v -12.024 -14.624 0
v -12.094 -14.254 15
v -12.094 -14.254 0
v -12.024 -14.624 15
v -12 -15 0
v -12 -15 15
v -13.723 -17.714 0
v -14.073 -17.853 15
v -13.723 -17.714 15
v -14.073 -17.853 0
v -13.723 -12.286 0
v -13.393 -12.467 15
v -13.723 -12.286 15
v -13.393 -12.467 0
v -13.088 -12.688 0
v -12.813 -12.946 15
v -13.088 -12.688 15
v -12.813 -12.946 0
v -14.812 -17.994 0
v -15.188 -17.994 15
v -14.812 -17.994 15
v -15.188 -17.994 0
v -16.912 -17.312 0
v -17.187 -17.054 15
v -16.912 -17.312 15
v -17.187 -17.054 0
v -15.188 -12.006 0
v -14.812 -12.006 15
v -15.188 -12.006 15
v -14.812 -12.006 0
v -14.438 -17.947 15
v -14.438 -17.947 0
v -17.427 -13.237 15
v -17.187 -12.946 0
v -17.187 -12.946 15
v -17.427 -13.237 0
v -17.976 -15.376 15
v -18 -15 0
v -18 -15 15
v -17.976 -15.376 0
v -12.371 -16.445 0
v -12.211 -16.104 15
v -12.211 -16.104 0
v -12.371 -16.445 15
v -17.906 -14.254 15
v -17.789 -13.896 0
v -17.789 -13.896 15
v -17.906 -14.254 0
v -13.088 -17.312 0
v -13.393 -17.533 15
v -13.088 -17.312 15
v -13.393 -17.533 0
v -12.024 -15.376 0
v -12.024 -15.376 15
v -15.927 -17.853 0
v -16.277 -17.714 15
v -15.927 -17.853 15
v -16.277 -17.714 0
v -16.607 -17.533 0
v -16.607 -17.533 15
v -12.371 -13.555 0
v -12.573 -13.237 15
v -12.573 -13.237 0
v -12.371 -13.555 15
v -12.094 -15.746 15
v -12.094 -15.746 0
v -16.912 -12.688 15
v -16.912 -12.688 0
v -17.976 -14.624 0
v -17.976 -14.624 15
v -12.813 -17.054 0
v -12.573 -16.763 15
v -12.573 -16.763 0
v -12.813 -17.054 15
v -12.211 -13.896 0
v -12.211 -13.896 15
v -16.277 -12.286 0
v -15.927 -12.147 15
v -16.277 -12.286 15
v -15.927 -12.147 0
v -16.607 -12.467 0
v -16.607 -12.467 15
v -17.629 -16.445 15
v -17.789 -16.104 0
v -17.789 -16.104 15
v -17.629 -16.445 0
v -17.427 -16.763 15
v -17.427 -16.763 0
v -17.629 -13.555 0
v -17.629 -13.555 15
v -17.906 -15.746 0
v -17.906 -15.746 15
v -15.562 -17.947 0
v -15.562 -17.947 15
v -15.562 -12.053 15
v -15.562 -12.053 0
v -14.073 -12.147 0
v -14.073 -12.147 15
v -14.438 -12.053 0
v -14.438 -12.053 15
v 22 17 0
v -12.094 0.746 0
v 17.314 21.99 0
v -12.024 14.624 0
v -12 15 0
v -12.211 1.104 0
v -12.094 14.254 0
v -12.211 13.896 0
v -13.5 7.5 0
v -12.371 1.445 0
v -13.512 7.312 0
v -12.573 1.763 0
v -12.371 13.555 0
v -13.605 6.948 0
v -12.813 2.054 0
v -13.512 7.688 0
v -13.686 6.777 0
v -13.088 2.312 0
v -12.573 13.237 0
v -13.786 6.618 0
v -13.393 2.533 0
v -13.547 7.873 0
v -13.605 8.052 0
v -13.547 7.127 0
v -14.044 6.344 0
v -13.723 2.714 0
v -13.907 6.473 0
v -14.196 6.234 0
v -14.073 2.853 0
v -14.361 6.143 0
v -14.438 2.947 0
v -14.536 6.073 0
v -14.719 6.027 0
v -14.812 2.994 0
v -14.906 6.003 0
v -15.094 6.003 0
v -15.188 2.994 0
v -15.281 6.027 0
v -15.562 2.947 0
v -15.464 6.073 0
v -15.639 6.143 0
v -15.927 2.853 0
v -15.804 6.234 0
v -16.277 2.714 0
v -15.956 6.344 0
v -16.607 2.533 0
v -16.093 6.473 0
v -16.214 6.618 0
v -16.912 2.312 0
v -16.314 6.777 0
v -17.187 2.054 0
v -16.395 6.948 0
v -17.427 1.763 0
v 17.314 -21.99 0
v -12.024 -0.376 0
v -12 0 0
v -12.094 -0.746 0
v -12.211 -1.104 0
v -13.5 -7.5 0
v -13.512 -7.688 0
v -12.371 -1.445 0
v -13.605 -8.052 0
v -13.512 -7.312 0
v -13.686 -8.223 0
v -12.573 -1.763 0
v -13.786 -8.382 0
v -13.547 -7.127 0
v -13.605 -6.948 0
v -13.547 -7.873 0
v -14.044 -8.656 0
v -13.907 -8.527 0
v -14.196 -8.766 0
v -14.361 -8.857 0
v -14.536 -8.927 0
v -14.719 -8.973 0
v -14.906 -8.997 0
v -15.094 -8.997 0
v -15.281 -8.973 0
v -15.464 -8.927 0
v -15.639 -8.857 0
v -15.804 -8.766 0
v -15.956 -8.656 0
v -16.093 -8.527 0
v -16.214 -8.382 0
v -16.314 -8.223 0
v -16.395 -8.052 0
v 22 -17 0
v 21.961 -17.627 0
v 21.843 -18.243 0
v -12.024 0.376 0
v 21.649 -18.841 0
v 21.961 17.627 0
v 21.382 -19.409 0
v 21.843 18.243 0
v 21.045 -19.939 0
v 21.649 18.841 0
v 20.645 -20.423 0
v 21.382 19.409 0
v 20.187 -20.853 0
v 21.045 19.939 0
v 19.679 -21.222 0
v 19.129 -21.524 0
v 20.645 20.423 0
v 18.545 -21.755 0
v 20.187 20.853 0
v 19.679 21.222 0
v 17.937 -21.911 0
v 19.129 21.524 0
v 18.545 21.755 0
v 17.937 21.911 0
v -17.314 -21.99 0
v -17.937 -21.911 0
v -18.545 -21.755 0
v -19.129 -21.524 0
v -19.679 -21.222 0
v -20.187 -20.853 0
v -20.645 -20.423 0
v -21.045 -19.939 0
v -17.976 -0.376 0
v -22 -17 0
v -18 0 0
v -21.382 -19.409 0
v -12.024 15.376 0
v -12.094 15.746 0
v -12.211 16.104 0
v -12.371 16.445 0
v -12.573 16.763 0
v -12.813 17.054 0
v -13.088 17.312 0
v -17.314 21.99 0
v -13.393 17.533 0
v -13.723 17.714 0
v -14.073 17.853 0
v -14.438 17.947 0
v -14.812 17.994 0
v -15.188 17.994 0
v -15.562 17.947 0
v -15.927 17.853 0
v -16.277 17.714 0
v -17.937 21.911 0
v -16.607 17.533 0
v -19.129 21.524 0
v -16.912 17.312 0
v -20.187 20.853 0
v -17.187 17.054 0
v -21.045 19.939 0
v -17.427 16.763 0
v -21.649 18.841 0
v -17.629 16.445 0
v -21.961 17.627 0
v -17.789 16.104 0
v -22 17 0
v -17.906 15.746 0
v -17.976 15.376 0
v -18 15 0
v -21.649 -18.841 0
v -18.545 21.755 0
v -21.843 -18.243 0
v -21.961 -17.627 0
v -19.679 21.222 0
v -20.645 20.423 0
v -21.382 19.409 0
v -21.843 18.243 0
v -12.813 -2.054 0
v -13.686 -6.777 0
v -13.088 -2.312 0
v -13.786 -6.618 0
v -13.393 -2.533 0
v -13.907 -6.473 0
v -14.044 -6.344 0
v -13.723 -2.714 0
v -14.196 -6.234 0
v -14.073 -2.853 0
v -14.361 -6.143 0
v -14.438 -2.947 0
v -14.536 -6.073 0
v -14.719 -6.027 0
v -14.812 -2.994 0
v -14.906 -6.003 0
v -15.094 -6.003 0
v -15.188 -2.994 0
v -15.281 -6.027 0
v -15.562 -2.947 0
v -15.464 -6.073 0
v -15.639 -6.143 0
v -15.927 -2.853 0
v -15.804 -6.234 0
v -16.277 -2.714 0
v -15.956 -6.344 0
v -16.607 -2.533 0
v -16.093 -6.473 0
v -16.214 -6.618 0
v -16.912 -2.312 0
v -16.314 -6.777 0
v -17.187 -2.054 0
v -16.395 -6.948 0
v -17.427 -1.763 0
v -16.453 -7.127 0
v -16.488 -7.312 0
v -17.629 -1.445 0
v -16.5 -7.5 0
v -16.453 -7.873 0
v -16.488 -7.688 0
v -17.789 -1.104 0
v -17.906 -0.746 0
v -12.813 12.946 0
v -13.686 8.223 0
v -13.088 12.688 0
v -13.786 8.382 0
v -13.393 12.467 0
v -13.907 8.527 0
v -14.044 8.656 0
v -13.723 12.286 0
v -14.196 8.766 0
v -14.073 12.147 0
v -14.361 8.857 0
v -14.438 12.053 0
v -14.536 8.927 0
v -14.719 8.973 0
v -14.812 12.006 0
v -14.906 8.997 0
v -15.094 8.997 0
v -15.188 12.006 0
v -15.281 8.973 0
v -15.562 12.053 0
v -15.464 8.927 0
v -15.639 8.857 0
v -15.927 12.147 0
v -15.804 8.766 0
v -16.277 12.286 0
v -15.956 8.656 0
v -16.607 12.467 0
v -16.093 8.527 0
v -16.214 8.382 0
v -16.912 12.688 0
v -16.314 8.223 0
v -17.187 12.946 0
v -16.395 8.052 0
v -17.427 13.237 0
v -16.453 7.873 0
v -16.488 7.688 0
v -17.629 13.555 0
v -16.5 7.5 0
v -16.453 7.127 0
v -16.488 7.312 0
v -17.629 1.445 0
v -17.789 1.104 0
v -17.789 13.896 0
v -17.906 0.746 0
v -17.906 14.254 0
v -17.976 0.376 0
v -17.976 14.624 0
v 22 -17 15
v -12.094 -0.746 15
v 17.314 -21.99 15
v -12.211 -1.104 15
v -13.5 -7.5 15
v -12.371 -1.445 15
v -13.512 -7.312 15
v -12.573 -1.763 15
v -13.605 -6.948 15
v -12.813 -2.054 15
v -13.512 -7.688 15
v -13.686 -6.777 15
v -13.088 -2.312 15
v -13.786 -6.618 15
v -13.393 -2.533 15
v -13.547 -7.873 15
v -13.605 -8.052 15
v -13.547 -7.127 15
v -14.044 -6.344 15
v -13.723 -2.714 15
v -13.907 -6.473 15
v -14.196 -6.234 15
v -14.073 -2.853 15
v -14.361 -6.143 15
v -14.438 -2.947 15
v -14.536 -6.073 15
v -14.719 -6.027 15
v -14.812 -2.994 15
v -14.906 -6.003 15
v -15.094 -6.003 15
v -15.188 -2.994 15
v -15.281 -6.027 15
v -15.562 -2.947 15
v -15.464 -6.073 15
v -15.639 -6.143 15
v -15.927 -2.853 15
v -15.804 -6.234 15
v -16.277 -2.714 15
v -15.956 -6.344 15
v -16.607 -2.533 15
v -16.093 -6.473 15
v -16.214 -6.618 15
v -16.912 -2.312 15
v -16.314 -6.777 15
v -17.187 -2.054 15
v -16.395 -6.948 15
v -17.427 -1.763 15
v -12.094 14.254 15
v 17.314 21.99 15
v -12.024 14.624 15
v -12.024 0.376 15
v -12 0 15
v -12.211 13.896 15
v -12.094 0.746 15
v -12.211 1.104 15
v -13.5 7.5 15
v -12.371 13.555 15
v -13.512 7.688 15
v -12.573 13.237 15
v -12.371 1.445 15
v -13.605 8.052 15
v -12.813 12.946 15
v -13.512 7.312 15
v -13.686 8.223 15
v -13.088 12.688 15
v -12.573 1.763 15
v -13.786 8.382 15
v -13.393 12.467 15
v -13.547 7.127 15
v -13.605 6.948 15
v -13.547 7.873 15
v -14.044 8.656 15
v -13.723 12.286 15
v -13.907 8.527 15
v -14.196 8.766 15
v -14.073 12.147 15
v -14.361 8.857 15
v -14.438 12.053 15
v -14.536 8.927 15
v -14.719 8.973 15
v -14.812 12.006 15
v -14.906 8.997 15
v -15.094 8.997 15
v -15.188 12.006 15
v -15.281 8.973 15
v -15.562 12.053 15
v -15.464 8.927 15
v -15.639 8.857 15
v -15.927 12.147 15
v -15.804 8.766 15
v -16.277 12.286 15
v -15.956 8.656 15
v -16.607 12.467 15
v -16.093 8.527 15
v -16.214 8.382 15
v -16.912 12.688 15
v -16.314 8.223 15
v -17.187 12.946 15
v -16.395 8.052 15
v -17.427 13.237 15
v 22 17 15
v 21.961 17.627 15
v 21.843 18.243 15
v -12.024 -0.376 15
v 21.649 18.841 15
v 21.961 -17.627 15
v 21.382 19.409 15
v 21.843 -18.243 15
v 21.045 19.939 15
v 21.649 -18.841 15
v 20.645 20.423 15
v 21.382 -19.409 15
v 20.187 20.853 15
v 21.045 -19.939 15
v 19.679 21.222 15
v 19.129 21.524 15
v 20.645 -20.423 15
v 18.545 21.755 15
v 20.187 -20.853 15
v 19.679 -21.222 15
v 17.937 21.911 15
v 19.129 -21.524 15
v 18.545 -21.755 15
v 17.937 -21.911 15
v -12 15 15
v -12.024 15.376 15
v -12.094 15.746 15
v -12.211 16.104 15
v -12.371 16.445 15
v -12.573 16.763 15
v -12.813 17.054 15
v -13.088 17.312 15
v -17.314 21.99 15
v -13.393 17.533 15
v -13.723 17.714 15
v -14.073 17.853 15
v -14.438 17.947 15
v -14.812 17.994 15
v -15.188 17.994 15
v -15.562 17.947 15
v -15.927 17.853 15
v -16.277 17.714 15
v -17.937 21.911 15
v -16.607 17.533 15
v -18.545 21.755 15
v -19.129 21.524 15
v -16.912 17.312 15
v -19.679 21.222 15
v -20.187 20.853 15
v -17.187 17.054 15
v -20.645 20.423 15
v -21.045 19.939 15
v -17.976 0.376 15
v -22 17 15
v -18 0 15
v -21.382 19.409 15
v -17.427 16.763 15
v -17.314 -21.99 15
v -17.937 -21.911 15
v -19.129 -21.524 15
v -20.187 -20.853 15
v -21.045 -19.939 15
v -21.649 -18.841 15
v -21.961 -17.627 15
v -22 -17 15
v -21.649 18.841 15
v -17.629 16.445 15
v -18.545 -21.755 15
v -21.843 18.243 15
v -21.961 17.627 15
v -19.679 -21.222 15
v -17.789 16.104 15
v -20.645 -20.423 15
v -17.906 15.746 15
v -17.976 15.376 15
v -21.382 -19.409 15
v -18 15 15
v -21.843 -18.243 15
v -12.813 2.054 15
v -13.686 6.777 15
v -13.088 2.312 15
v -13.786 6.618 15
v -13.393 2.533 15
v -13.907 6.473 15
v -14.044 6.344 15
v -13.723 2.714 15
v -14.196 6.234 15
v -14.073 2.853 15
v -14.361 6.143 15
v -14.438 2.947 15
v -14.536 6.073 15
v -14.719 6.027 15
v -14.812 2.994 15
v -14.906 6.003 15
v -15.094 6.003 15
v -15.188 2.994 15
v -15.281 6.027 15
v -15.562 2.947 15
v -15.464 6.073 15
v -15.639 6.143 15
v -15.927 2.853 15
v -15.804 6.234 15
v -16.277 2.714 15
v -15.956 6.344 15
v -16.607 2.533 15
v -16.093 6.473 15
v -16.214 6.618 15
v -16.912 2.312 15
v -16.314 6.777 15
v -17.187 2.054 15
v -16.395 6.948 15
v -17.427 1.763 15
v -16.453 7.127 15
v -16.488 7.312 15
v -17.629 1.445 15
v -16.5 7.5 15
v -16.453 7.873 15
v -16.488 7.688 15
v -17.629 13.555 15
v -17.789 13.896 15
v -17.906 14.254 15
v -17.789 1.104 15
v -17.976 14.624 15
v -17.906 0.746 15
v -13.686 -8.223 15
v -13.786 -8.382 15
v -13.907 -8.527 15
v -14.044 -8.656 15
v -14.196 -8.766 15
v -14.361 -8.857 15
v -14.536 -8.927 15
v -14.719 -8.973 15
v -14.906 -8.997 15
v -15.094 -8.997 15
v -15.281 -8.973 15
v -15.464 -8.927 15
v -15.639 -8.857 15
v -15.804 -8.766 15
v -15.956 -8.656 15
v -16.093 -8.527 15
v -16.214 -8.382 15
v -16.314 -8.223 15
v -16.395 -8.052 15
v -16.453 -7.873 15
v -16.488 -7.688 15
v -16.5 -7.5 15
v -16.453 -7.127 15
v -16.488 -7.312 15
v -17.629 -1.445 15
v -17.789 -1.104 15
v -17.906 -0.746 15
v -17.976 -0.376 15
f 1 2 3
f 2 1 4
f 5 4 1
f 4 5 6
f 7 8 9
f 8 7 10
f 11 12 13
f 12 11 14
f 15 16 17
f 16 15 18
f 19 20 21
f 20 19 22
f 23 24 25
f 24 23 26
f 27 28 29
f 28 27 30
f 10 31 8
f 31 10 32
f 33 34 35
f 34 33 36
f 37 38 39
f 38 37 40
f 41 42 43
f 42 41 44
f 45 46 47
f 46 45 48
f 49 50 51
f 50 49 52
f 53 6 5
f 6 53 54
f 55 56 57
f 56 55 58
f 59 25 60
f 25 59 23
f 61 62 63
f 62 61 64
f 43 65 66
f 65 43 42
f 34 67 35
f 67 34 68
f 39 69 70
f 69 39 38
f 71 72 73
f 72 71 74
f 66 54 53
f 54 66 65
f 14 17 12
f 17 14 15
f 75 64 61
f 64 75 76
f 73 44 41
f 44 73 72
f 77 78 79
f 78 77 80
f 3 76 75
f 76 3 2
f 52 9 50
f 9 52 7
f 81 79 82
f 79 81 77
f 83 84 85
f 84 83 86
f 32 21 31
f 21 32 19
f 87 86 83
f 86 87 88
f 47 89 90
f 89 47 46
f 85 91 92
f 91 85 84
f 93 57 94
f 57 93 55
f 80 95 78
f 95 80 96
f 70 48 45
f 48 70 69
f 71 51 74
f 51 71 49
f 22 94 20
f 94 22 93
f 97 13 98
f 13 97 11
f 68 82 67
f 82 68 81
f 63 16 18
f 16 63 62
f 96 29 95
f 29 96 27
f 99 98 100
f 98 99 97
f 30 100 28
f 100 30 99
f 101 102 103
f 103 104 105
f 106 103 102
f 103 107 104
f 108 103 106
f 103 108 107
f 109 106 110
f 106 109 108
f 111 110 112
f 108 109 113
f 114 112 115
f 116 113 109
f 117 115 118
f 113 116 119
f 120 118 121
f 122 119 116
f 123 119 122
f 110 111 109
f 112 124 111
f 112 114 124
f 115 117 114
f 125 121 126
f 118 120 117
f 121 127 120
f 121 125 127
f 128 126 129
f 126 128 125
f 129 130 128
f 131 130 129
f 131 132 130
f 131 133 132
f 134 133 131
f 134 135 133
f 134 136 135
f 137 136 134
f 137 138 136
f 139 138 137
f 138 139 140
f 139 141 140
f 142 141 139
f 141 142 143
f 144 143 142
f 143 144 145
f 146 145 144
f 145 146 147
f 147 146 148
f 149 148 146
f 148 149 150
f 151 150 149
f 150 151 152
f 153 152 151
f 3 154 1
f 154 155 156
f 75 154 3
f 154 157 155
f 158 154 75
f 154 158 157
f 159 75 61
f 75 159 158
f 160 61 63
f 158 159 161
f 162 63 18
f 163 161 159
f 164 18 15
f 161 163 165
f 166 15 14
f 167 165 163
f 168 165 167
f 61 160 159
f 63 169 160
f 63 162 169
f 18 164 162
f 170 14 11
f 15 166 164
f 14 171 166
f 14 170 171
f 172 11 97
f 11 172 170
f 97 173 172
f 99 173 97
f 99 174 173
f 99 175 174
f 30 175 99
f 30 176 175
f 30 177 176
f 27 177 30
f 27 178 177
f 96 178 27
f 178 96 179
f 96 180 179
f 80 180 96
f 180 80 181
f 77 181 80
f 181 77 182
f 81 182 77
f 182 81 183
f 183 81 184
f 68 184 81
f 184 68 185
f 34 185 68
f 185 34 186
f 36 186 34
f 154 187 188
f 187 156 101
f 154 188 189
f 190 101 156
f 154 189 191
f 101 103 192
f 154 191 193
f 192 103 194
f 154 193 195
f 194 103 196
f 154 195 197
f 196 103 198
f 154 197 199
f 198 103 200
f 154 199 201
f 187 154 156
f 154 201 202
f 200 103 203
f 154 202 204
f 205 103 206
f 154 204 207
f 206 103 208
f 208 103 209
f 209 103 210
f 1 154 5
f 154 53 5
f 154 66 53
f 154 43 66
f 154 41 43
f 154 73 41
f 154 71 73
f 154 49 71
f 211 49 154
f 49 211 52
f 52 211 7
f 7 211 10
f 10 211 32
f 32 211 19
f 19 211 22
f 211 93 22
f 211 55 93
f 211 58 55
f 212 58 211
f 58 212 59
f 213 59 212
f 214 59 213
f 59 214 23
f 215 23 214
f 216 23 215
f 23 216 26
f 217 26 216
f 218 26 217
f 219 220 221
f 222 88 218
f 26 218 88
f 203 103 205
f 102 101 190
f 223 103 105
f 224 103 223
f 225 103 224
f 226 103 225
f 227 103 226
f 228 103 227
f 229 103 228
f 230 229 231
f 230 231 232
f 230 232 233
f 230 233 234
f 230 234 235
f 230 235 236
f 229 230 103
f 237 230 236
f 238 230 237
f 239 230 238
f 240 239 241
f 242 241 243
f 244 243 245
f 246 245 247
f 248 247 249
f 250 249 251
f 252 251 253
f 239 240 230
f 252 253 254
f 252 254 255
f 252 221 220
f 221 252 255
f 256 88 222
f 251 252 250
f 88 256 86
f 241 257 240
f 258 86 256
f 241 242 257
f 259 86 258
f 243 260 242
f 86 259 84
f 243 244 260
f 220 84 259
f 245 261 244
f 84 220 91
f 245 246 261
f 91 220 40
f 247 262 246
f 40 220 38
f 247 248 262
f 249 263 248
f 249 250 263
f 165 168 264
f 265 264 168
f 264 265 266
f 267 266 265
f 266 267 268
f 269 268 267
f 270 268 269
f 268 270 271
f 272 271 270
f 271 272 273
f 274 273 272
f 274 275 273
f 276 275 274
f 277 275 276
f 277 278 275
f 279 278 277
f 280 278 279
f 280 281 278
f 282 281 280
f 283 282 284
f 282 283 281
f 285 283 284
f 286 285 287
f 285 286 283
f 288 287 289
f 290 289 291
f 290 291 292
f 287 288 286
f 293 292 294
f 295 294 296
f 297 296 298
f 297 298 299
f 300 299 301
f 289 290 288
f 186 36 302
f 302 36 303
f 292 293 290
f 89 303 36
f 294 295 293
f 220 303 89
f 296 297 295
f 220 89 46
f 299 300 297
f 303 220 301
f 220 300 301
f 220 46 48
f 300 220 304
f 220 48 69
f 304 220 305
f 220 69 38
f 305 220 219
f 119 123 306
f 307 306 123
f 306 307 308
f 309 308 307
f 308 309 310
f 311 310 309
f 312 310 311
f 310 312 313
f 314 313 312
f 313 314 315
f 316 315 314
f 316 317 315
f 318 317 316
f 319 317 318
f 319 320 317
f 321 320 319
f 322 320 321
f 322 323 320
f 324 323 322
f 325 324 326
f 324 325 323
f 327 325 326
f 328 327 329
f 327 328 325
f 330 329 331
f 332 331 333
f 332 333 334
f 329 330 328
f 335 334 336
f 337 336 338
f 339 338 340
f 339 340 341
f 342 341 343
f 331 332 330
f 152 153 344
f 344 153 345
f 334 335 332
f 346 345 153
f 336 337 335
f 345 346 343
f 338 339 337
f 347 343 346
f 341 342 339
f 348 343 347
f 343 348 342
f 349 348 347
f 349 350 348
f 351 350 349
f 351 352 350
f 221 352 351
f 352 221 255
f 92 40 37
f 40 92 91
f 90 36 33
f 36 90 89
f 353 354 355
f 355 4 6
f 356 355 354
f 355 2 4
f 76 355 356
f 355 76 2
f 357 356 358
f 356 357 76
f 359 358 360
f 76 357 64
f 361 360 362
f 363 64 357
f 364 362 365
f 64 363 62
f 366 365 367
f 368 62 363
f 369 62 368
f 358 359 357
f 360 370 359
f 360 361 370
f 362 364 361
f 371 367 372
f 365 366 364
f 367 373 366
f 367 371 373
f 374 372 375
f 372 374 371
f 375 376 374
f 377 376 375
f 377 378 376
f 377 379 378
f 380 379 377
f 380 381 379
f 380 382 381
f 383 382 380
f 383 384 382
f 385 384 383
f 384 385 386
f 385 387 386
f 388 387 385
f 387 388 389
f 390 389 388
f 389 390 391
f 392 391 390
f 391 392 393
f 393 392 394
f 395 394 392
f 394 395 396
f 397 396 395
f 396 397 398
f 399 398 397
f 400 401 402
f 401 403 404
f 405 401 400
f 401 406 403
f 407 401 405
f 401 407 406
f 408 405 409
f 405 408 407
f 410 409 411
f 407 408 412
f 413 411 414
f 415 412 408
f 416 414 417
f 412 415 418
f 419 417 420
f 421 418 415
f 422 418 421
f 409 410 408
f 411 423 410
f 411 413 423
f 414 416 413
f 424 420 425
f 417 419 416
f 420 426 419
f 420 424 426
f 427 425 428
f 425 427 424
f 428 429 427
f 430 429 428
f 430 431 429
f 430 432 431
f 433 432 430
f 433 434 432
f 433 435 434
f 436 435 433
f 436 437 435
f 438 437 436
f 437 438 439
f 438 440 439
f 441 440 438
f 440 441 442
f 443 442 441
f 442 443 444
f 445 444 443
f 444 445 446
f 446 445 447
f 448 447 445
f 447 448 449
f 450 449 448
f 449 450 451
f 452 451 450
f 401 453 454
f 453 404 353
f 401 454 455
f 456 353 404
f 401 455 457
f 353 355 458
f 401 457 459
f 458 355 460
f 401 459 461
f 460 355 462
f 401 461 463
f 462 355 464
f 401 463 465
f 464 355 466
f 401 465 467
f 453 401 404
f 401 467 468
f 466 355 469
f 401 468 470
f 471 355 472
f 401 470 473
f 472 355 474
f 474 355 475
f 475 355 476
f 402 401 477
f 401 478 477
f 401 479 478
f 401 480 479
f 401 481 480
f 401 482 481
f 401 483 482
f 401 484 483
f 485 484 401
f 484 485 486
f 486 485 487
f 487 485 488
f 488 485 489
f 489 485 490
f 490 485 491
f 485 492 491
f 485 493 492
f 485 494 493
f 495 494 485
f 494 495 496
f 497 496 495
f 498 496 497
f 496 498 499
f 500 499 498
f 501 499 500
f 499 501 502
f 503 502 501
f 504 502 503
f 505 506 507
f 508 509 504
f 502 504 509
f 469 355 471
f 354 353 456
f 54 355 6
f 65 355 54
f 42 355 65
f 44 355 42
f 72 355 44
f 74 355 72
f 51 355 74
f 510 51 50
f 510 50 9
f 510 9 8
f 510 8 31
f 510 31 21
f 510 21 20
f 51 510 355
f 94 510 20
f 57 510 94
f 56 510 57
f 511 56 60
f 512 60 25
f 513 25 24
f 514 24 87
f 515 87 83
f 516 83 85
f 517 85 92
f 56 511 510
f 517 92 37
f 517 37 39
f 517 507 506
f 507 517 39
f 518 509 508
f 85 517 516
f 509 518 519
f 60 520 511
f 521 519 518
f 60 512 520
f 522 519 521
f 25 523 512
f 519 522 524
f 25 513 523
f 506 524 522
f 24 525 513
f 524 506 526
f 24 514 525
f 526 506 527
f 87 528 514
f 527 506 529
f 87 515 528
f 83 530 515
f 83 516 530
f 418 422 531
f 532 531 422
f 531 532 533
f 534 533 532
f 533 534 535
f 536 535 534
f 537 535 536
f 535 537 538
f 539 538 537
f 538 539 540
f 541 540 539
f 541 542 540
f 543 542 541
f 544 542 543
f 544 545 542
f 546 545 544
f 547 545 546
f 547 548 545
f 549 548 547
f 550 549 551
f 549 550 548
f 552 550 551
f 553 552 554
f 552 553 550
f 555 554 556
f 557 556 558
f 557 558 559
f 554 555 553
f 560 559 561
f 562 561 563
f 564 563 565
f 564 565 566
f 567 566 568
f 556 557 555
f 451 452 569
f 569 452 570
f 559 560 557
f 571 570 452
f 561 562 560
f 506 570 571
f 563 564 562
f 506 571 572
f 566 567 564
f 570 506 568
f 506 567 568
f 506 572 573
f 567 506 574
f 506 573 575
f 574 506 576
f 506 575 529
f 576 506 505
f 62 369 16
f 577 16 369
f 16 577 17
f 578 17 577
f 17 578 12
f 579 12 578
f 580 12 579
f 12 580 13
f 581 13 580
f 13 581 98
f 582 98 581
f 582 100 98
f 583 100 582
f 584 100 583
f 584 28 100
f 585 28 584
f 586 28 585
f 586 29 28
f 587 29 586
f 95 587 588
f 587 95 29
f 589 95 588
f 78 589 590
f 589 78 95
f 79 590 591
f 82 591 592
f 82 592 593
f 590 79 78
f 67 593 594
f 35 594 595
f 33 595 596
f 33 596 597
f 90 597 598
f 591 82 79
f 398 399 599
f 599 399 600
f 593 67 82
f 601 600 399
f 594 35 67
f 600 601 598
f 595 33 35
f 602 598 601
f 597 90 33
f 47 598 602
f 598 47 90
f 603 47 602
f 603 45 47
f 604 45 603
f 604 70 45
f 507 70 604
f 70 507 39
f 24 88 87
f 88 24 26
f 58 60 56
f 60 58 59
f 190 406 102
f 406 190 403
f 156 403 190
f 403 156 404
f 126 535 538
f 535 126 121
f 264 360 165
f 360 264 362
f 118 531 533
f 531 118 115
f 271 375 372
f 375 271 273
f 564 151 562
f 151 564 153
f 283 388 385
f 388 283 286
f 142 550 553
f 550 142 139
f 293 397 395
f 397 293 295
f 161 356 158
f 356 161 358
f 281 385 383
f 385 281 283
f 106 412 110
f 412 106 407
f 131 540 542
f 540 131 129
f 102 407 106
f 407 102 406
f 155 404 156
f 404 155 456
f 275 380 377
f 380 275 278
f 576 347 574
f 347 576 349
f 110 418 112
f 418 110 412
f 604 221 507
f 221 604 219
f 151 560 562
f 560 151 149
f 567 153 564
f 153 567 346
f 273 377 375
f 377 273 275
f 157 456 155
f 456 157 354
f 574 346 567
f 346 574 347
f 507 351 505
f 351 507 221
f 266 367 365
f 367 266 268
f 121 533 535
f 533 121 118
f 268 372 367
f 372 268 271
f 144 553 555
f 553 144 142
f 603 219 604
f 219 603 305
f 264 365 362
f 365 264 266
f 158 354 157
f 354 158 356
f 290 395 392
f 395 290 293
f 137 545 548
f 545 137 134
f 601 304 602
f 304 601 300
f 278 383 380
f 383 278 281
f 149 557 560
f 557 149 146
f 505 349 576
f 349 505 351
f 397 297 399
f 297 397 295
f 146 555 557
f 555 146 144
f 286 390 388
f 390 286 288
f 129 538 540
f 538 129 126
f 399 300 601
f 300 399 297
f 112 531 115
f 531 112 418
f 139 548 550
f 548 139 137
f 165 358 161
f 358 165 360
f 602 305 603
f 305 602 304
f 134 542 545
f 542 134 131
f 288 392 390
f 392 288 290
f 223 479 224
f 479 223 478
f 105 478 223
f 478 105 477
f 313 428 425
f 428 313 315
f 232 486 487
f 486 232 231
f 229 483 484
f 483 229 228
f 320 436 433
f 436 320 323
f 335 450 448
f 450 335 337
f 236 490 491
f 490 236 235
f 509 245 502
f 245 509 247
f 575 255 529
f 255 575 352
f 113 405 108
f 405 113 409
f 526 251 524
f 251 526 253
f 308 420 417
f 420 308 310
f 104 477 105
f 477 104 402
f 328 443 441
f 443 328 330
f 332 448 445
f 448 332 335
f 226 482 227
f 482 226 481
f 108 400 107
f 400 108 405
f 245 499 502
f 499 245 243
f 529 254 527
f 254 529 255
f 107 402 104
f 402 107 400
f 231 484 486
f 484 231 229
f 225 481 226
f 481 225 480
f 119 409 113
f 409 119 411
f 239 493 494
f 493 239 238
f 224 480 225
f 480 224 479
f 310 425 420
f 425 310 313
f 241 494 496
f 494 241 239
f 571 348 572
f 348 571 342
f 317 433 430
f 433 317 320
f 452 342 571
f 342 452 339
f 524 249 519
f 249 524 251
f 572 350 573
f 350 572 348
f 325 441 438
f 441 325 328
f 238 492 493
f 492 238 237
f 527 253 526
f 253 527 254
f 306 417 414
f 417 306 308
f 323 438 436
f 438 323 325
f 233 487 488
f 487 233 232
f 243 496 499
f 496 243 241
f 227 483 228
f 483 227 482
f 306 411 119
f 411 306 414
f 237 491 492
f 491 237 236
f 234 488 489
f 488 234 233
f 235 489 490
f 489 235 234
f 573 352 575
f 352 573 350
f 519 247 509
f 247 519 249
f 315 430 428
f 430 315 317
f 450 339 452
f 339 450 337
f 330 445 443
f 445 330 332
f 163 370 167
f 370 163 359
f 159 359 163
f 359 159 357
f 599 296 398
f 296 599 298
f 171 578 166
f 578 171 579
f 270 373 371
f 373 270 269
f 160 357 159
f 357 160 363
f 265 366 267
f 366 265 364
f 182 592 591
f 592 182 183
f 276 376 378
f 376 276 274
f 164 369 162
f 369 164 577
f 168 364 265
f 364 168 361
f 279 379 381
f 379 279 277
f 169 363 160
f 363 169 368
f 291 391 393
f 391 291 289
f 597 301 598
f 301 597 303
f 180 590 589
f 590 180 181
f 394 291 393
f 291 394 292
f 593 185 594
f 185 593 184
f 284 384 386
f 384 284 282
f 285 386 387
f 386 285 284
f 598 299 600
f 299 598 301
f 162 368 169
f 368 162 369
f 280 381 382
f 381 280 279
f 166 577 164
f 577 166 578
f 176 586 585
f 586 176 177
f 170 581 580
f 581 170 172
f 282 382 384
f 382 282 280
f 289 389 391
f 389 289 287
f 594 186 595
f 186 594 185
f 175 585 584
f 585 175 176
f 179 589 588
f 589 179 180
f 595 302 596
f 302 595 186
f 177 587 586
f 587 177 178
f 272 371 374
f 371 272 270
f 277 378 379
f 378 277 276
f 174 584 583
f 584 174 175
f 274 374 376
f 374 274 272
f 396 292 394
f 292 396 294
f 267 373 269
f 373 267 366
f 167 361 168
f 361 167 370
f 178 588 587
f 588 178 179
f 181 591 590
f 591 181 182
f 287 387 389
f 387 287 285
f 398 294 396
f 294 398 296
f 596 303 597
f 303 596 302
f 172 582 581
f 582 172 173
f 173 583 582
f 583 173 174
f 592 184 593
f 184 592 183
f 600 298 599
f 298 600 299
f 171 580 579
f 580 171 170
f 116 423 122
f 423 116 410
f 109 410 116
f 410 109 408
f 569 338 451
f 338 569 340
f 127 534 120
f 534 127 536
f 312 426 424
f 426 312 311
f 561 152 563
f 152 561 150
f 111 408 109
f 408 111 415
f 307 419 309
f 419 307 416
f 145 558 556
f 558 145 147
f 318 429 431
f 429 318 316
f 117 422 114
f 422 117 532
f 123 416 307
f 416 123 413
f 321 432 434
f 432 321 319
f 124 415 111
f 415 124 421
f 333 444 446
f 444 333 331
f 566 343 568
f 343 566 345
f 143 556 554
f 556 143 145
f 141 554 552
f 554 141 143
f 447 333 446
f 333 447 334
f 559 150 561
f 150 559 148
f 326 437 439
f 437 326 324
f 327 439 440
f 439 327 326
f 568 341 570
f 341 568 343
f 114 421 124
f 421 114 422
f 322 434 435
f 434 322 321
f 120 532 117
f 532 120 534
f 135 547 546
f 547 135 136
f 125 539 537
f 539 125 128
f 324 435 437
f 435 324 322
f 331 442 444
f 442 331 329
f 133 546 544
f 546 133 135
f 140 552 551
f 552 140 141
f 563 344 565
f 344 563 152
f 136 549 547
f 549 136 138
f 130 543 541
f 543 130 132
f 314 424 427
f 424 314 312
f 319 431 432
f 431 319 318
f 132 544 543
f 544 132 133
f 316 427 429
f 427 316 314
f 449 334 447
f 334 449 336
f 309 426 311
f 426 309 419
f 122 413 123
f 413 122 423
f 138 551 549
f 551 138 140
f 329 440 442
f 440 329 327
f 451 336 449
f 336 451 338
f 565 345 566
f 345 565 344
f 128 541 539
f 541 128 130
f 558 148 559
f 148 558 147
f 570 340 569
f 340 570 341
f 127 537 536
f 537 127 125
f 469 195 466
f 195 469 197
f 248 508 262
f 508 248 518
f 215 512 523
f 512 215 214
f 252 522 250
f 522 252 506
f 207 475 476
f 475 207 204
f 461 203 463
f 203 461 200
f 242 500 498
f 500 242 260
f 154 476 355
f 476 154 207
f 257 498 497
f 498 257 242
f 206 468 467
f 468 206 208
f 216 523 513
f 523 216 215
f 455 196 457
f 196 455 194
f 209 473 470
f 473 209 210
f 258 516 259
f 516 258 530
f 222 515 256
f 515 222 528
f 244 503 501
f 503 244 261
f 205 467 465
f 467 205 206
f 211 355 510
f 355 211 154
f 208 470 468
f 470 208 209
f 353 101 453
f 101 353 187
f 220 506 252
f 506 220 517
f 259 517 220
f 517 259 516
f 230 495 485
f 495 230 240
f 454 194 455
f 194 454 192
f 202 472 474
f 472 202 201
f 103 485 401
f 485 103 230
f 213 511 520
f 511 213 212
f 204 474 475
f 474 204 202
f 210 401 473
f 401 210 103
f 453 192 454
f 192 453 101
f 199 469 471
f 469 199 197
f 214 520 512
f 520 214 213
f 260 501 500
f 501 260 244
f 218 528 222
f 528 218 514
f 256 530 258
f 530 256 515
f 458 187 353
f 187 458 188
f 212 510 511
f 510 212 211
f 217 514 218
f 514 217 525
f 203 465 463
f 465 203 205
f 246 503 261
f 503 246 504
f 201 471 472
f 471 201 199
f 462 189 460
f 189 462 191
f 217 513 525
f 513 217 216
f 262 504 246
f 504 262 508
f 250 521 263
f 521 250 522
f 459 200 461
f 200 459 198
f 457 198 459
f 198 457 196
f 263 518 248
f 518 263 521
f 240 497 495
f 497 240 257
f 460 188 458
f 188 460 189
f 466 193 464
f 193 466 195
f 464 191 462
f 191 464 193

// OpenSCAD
$fn = 50;


difference() {
	union() {
		hull() {
			translate(v = [-17.0000000000, 17.0000000000, 0]) {
				cylinder(h = 15, r = 5);
			}
			translate(v = [17.0000000000, 17.0000000000, 0]) {
				cylinder(h = 15, r = 5);
			}
			translate(v = [-17.0000000000, -17.0000000000, 0]) {
				cylinder(h = 15, r = 5);
			}
			translate(v = [17.0000000000, -17.0000000000, 0]) {
				cylinder(h = 15, r = 5);
			}
		}
	}
	union() {
		translate(v = [-15.0000000000, -15.0000000000, 0]) {
			cylinder(h = 15, r = 3.0000000000);
		}
		translate(v = [-15.0000000000, 0.0000000000, 0]) {
			cylinder(h = 15, r = 3.0000000000);
		}
		translate(v = [-15.0000000000, 15.0000000000, 0]) {
			cylinder(h = 15, r = 3.0000000000);
		}
		translate(v = [-15.0000000000, -15.0000000000, 0]) {
			cylinder(h = 15, r = 1.5000000000);
		}
		translate(v = [-15.0000000000, -7.5000000000, 0]) {
			cylinder(h = 15, r = 1.5000000000);
		}
		translate(v = [-15.0000000000, 0.0000000000, 0]) {
			cylinder(h = 15, r = 1.5000000000);
		}
		translate(v = [-15.0000000000, 7.5000000000, 0]) {
			cylinder(h = 15, r = 1.5000000000);
		}
		translate(v = [-15.0000000000, 15.0000000000, 0]) {
			cylinder(h = 15, r = 1.5000000000);
		}
		translate(v = [-15.0000000000, -15.0000000000, 0]) {
			cylinder(h = 15, r = 1.5000000000);
		}
		translate(v = [-15.0000000000, -7.5000000000, 0]) {
			cylinder(h = 15, r = 1.5000000000);
		}
		translate(v = [-15.0000000000, 0.0000000000, 0]) {
			cylinder(h = 15, r = 1.5000000000);
		}
		translate(v = [-15.0000000000, 7.5000000000, 0]) {
			cylinder(h = 15, r = 1.5000000000);
		}
		translate(v = [-15.0000000000, 15.0000000000, 0]) {
			cylinder(h = 15, r = 1.5000000000);
		}
		translate(v = [-15.0000000000, -15.0000000000, 0]) {
			cylinder(h = 15, r = 1.5000000000);
		}
		translate(v = [-15.0000000000, -7.5000000000, 0]) {
			cylinder(h = 15, r = 1.5000000000);
		}
		translate(v = [-15.0000000000, 0.0000000000, 0]) {
			cylinder(h = 15, r = 1.5000000000);
		}
		translate(v = [-15.0000000000, 7.5000000000, 0]) {
			cylinder(h = 15, r = 1.5000000000);
		}
		translate(v = [-15.0000000000, 15.0000000000, 0]) {
			cylinder(h = 15, r = 1.5000000000);
		}
	}
}
